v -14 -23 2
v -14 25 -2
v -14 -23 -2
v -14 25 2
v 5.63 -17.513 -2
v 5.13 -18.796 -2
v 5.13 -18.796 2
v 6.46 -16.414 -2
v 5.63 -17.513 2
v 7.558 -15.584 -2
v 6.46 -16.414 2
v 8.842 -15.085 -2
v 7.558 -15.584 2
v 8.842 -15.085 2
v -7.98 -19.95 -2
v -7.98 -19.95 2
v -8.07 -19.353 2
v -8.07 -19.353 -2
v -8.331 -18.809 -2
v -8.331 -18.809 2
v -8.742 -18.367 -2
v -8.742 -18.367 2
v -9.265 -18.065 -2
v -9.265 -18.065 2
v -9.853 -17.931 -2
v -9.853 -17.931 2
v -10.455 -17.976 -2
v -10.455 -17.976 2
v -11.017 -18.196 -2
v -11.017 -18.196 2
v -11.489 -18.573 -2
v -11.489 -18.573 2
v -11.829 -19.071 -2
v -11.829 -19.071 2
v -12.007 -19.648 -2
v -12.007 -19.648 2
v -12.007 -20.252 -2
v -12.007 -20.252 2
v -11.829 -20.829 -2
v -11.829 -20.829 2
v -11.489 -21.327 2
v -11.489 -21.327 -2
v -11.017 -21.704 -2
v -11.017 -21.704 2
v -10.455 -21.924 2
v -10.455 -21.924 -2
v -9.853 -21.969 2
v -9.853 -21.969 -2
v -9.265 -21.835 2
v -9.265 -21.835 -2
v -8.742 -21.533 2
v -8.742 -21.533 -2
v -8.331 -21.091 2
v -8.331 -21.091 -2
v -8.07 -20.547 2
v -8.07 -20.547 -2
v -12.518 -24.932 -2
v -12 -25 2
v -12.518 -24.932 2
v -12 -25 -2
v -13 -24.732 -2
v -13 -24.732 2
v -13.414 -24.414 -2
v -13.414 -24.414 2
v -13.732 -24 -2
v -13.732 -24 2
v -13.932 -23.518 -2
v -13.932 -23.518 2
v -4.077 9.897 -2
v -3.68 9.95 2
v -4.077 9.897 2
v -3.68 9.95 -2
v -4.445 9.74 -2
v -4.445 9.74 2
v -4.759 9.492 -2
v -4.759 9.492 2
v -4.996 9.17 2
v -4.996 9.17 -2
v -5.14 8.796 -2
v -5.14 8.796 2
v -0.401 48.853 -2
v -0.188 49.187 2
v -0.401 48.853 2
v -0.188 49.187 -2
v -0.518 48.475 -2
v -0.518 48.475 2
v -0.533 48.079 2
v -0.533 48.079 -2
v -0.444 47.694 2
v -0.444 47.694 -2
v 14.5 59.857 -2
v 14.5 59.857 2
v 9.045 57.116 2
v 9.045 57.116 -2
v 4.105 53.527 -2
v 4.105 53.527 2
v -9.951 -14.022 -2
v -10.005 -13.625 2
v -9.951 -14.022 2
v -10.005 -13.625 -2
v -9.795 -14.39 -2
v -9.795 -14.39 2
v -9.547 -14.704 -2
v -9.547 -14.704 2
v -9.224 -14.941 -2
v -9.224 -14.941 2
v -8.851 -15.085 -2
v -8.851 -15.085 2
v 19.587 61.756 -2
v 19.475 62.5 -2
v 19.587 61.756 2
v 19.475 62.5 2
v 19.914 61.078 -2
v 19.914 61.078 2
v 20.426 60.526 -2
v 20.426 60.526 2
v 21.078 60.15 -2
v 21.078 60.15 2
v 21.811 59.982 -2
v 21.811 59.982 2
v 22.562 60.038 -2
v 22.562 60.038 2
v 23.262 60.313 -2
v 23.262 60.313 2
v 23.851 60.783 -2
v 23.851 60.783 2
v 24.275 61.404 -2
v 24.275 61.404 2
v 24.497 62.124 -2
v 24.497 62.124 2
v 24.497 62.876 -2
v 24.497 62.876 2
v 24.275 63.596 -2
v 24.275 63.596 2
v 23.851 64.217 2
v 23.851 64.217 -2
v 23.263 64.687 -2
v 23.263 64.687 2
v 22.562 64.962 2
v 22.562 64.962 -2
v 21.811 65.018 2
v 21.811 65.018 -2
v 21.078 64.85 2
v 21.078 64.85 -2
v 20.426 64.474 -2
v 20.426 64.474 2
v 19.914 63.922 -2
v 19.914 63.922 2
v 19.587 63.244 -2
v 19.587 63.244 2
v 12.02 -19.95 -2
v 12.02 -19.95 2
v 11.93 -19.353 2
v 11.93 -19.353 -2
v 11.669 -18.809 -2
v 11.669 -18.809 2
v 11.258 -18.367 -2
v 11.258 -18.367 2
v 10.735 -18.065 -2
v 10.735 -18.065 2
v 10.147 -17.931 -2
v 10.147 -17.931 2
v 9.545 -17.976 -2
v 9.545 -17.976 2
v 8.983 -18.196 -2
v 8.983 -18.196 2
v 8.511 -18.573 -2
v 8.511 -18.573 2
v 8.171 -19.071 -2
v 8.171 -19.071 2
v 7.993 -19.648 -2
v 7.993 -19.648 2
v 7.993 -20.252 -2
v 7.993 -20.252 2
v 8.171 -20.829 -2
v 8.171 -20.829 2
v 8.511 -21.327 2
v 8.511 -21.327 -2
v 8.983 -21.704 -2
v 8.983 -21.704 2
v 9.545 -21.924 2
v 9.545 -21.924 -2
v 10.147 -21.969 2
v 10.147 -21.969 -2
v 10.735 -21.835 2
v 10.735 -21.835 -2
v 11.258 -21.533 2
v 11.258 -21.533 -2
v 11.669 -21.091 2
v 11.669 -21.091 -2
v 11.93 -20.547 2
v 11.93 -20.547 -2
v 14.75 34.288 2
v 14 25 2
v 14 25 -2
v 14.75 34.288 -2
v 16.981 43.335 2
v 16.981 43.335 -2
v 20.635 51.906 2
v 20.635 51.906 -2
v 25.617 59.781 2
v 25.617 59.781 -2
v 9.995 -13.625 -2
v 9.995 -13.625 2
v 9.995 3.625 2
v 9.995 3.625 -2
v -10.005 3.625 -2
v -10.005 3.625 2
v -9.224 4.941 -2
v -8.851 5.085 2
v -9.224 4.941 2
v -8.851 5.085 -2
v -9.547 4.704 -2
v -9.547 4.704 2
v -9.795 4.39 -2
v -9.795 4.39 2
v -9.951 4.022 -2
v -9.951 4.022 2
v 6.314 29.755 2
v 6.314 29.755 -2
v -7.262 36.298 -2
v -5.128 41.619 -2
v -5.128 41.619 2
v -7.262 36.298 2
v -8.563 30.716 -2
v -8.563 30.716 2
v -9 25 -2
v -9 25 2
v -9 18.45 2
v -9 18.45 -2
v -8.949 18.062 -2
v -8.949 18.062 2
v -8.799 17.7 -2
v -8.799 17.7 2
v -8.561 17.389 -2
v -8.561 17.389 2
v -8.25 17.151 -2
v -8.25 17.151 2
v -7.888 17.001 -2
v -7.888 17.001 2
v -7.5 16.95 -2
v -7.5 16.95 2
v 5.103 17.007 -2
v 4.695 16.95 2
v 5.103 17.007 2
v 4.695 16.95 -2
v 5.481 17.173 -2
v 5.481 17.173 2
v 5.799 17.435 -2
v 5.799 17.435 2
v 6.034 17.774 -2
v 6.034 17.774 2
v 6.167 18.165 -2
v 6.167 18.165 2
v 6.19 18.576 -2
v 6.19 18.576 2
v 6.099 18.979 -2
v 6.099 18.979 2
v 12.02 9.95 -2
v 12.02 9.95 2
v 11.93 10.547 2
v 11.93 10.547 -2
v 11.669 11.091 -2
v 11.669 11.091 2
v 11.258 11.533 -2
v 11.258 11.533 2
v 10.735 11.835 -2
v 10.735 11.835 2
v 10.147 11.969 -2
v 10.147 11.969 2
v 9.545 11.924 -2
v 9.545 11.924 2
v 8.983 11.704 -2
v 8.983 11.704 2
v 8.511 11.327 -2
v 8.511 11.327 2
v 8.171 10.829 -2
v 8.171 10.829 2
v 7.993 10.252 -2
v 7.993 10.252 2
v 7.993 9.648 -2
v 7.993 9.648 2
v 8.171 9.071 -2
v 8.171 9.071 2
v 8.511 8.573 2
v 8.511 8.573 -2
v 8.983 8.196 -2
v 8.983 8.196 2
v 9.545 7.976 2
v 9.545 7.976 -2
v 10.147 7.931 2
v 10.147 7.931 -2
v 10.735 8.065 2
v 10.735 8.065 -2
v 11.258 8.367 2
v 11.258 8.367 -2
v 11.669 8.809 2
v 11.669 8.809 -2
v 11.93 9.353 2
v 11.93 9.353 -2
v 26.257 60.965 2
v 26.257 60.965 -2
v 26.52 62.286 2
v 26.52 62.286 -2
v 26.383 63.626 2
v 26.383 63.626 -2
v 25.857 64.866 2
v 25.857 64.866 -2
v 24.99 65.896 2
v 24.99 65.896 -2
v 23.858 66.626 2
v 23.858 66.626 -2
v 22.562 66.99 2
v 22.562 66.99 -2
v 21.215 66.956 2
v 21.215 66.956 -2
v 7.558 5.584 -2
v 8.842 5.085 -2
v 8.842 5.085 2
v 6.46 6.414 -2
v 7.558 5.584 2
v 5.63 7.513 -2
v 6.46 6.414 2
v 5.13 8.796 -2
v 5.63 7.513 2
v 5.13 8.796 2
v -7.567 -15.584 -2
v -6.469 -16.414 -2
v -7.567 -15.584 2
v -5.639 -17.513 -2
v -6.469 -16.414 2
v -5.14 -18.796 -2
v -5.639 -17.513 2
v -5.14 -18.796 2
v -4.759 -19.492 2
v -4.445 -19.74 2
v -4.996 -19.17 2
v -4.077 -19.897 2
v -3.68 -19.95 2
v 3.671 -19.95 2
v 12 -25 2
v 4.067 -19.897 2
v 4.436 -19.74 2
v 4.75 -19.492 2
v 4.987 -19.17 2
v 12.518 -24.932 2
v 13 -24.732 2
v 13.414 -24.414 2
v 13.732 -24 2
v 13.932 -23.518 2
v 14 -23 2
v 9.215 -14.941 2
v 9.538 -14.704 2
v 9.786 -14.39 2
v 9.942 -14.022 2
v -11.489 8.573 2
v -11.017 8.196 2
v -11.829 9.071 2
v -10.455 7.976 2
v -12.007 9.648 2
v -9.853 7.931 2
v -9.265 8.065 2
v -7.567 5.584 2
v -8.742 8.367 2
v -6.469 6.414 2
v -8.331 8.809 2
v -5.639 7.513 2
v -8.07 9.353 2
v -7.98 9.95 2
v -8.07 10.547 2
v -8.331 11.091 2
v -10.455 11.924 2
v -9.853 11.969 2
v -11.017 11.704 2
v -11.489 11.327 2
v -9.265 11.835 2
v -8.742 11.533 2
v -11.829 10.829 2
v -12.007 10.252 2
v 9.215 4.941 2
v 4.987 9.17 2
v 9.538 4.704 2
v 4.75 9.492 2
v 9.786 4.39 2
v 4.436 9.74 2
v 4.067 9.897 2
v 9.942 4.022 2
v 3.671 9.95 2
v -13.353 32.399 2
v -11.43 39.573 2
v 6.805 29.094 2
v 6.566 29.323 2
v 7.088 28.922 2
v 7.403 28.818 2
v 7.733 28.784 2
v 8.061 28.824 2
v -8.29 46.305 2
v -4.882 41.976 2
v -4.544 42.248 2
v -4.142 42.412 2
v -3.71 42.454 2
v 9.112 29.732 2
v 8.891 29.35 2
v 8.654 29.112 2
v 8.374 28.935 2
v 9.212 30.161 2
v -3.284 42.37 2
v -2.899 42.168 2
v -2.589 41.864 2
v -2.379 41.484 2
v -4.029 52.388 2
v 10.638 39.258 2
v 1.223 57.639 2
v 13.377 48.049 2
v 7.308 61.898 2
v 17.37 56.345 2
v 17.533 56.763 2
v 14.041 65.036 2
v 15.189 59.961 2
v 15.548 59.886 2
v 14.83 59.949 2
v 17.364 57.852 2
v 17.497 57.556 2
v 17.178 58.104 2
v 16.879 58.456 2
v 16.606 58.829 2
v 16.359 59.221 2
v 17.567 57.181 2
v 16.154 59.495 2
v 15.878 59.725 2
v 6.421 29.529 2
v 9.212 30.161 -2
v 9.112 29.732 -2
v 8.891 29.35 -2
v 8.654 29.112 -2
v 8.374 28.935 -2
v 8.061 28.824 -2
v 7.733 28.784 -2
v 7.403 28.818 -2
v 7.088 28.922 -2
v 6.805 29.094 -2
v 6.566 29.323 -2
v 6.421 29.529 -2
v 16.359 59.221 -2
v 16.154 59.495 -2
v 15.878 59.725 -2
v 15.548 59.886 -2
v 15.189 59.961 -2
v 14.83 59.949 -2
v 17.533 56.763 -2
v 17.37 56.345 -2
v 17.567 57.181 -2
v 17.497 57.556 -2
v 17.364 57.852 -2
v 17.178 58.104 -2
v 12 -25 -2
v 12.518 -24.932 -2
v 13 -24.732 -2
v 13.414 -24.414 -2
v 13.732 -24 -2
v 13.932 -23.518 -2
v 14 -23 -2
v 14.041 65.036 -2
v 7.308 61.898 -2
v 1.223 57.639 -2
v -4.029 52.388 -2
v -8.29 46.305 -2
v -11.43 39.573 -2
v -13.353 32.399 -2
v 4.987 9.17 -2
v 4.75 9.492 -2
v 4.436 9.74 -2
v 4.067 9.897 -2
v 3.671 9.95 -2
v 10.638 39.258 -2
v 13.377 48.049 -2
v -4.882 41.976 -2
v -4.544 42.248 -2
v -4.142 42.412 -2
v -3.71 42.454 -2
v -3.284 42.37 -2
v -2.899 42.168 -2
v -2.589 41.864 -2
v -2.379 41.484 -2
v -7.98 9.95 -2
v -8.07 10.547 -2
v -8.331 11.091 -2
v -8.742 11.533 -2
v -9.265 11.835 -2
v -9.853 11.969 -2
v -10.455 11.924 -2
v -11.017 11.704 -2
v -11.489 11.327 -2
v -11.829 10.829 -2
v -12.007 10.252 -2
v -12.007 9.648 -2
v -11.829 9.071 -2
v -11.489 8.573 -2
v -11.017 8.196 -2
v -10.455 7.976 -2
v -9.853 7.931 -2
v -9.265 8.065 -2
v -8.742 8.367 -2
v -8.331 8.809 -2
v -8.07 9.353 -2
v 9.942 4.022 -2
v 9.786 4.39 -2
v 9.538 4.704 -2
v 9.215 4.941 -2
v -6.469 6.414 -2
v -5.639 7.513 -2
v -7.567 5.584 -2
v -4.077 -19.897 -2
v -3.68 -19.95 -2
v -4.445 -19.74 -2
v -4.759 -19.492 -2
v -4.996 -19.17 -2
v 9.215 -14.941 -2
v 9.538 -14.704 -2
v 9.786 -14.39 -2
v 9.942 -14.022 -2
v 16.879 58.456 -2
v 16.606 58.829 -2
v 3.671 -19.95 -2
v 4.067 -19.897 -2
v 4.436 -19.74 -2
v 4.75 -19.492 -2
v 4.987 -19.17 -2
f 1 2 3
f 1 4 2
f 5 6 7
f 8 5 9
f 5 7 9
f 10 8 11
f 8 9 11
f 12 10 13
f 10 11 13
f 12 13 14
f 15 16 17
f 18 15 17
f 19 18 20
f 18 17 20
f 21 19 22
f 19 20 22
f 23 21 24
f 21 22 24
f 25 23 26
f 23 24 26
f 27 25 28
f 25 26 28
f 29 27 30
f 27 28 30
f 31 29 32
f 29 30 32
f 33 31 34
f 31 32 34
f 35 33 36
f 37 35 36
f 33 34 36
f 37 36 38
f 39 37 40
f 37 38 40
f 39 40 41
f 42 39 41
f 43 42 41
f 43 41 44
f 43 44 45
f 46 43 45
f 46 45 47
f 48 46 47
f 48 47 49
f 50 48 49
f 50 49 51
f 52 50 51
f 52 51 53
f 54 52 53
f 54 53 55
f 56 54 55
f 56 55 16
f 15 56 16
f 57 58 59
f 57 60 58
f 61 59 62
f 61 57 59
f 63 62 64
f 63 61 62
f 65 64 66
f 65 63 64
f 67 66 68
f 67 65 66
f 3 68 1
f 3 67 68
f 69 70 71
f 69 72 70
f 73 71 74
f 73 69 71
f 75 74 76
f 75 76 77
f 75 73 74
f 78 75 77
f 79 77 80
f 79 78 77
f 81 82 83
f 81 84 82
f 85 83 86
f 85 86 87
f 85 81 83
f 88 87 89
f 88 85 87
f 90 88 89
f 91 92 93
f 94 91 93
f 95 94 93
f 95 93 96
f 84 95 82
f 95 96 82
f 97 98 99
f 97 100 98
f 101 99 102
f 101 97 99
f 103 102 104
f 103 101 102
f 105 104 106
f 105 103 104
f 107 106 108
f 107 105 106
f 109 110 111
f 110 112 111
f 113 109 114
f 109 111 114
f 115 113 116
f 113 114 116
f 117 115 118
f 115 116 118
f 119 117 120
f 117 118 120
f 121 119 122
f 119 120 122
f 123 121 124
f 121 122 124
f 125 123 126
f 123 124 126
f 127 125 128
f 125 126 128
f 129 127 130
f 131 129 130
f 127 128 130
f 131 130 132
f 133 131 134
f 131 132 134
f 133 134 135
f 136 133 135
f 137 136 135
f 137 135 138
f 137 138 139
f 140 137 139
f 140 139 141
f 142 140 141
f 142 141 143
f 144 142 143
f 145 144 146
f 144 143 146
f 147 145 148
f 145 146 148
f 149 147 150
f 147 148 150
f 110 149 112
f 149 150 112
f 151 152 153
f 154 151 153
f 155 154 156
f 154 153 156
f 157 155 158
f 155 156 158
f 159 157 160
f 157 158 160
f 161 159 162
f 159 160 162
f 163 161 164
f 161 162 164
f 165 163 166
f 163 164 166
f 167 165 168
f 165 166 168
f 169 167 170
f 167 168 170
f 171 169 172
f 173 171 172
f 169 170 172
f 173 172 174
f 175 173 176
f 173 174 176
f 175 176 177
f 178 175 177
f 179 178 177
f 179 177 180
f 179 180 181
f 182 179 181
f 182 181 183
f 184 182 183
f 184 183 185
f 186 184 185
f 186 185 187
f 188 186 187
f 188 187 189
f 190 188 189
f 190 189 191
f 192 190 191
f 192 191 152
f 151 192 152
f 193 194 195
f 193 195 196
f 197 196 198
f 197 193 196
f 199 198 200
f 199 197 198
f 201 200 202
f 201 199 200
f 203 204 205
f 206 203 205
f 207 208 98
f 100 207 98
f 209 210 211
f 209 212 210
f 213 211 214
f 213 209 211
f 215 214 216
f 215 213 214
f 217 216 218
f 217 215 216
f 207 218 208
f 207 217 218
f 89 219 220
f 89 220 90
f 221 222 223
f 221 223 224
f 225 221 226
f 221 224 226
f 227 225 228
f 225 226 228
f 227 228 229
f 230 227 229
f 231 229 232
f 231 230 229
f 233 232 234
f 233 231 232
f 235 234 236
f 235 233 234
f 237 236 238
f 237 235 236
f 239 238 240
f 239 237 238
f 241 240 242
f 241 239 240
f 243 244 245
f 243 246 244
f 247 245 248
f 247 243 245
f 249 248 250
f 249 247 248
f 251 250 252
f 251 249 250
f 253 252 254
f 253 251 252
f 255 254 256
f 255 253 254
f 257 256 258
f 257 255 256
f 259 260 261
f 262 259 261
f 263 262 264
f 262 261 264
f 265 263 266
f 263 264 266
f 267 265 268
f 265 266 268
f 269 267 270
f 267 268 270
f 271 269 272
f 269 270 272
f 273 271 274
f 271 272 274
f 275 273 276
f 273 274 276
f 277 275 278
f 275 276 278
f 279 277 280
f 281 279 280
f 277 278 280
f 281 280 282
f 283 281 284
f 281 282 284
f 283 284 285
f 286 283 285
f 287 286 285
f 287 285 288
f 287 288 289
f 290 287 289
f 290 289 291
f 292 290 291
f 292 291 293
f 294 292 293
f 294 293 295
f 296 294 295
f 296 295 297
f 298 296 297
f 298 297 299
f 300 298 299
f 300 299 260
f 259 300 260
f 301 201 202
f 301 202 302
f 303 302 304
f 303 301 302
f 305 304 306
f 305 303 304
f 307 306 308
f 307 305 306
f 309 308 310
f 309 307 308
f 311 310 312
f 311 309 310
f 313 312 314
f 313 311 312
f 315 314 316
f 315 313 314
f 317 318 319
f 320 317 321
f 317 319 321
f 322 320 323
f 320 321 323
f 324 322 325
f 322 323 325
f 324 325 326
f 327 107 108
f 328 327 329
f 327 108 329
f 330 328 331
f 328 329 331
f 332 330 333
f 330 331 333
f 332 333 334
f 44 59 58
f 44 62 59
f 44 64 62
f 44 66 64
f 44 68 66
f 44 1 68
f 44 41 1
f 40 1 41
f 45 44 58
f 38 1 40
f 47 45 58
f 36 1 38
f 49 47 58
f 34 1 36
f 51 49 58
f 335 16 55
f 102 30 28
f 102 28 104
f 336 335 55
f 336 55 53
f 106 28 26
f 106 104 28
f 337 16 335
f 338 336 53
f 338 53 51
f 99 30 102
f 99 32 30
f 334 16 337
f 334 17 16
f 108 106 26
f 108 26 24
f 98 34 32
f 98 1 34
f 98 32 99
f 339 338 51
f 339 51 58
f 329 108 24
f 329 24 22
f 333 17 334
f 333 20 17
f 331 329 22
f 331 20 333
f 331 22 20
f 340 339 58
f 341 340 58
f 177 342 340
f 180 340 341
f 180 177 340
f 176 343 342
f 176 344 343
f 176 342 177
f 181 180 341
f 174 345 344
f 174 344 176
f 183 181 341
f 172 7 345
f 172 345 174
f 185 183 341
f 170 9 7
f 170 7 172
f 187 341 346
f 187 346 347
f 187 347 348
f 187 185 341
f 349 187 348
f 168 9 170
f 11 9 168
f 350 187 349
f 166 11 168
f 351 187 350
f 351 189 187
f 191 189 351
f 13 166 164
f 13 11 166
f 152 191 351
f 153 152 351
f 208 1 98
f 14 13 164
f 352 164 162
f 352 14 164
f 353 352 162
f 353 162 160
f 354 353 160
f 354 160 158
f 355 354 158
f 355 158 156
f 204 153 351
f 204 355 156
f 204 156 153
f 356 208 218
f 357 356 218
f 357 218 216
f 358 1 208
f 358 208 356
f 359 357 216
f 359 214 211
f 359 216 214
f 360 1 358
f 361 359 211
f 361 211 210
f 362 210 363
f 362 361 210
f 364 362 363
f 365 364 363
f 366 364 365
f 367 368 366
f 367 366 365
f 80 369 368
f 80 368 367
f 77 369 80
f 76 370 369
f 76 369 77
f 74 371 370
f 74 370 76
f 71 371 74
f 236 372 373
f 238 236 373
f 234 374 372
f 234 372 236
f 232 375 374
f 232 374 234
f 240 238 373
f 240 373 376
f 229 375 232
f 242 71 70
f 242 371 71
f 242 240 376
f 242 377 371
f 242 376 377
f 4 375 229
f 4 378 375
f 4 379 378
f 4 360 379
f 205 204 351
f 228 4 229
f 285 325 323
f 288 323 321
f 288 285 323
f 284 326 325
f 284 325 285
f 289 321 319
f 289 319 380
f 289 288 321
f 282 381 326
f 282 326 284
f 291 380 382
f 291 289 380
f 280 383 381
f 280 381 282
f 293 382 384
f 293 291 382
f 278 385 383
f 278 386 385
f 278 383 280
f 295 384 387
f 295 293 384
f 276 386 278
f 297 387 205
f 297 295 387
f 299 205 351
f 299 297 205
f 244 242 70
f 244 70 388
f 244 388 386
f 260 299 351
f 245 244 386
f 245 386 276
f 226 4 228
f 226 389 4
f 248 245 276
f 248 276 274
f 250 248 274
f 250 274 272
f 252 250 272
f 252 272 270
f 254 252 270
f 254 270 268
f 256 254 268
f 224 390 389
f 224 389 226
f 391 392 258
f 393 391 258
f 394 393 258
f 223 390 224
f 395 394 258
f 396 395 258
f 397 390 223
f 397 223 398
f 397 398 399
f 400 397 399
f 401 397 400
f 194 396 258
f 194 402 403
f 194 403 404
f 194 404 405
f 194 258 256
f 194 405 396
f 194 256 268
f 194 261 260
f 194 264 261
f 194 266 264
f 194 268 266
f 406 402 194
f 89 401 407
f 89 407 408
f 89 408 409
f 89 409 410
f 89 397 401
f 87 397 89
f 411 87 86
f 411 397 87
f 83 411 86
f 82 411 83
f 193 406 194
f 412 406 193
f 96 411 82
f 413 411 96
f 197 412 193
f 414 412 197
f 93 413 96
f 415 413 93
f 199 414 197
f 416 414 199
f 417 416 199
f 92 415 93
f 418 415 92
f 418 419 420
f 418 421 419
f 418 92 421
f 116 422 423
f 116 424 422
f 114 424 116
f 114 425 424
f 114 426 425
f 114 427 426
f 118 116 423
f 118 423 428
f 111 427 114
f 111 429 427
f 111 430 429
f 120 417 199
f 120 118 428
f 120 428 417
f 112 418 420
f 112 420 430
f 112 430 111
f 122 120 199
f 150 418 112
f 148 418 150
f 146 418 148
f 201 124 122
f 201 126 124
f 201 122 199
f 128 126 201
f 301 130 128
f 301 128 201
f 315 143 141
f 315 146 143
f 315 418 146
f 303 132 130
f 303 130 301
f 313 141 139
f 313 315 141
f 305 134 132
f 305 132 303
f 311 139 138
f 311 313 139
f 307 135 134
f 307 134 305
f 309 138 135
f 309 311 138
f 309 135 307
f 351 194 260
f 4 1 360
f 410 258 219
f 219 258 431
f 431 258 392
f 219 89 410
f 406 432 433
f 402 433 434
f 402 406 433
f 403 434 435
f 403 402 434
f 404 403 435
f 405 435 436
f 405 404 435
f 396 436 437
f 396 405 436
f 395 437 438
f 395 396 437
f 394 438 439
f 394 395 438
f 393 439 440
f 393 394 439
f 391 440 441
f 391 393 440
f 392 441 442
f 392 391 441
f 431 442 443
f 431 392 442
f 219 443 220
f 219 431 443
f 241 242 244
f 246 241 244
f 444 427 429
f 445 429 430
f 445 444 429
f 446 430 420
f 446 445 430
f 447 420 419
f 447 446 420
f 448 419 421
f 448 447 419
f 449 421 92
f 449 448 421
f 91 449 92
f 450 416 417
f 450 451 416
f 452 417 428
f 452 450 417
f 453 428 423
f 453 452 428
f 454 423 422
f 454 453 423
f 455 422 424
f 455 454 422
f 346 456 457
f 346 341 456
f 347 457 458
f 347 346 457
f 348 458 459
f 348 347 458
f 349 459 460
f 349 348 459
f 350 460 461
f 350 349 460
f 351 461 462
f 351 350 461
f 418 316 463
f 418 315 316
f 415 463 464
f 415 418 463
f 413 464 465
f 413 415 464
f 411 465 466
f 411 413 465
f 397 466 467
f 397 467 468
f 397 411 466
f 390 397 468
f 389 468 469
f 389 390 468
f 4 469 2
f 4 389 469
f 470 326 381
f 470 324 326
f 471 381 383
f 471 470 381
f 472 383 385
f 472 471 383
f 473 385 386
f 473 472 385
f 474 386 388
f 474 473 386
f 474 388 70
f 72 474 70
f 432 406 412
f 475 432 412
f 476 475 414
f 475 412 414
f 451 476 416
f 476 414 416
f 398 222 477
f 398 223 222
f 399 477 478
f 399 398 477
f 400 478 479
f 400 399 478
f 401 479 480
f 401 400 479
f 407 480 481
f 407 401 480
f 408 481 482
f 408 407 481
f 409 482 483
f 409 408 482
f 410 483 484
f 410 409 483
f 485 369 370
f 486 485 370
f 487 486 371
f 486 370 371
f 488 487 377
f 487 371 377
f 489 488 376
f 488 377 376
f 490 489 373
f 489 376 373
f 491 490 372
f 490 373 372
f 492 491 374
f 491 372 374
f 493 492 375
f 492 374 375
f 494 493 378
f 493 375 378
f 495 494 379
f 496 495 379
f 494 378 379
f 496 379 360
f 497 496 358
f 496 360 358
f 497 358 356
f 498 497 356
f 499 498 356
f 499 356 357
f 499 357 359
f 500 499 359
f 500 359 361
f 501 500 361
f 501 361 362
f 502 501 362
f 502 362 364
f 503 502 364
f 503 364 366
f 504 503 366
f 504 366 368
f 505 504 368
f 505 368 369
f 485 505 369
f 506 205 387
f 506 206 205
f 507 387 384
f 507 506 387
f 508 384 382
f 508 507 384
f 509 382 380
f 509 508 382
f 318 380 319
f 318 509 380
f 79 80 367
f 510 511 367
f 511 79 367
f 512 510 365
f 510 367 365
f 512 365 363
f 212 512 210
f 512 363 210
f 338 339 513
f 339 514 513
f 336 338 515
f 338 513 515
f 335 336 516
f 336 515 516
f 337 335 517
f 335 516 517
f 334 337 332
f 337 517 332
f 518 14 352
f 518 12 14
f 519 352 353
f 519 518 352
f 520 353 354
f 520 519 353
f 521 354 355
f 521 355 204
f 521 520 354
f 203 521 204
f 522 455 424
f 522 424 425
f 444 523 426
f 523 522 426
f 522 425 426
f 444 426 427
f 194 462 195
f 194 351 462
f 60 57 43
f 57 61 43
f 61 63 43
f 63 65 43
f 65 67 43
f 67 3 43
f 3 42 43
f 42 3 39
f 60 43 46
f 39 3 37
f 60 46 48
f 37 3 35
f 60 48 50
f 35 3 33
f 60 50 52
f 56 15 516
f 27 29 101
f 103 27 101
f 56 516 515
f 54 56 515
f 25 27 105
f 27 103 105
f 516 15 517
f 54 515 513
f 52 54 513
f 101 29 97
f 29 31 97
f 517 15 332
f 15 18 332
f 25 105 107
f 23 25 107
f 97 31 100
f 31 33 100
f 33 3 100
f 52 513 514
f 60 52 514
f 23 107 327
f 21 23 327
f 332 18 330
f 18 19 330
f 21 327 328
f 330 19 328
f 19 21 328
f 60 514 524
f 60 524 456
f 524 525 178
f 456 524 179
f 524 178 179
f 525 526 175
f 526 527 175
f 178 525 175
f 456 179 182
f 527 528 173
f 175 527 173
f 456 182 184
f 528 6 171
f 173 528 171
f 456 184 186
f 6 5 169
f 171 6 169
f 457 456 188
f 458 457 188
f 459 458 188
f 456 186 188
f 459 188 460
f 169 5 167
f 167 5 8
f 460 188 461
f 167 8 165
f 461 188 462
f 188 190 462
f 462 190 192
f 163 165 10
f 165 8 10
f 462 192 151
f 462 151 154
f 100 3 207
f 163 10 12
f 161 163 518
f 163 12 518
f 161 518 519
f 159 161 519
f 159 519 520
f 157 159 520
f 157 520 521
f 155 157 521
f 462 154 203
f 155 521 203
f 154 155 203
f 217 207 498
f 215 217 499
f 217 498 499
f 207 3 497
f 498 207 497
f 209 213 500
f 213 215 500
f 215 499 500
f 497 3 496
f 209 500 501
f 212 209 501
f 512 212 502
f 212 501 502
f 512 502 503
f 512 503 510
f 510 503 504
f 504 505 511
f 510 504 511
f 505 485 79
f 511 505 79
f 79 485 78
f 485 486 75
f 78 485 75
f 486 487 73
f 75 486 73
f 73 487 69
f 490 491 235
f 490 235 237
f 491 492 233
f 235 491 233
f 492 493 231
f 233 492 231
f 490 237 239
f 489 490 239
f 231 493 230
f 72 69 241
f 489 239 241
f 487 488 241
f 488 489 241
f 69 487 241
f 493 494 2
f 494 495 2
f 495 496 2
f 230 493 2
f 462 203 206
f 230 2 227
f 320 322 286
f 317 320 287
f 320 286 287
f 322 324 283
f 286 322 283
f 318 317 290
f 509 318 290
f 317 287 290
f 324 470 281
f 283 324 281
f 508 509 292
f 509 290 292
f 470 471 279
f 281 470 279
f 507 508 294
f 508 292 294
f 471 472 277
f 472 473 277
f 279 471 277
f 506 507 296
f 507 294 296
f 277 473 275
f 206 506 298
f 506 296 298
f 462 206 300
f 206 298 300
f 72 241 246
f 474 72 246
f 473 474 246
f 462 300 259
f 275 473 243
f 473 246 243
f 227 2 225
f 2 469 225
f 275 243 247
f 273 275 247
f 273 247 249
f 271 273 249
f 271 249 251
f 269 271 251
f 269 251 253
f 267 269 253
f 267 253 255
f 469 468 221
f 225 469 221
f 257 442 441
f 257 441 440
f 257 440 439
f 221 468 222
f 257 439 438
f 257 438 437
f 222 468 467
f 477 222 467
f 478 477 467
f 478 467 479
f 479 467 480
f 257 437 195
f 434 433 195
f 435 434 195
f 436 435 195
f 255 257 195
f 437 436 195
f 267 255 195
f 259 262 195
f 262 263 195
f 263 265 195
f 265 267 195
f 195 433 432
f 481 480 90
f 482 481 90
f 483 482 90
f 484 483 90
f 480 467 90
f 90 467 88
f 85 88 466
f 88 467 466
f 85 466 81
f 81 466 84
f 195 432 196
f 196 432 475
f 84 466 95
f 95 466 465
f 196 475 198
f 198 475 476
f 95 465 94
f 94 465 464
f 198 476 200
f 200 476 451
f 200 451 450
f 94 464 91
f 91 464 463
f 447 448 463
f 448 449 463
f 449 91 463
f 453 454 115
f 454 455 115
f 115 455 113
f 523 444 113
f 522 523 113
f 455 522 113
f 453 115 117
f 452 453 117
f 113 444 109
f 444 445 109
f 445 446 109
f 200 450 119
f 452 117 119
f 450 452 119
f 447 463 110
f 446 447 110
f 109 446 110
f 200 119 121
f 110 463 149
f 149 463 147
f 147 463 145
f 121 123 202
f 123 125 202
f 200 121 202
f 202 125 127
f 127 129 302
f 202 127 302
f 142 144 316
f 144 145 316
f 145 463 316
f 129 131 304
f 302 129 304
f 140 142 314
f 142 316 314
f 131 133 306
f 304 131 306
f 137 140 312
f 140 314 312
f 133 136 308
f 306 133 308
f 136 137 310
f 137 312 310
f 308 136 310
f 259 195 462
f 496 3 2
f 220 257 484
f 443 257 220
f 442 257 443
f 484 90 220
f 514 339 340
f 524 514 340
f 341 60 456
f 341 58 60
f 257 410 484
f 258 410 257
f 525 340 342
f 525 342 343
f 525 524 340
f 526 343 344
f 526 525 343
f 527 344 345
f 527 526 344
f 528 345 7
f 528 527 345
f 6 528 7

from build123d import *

# Parameters (mm, degrees)
SKETCH_1_R          = 1.525
EXTRUDE_1_DEPTH     = 2
FILLET_1_R          = 2
SKETCH_3_R          = 2.525
CUT_EXTRUDE_1_DEPTH = 11
SKETCH_4_R          = 2.025
CUT_EXTRUDE_2_DEPTH = 20
CUT_EXTRUDE_3_DEPTH = 20
FILLET_2_R          = 1.5
CUT_EXTRUDE_4_DEPTH = 10
EXTRUDE_2_DEPTH     = 4
FILLET_3_R          = 1.5


with BuildPart() as part:
    # 草图1 → 凸台-拉伸1 (new, symmetric)
    with BuildSketch(Plane.XY):
        with BuildLine():
            Line((-14, -25), (14, -25))
            Line((14, -25), (14, 25))
            ThreePointArc((14, 25), (16.980954382, 43.334686237), (25.616740047, 59.780658824))
            ThreePointArc((25.616740047, 59.780658824), (25.857254614, 64.865842734), (21.215464165, 66.956470411))
            ThreePointArc((21.215464165, 66.956470411), (-4.029350016, 52.38829278), (-14, 25))
            Line((-14, 25), (-14, -25))
        make_face()
        with Locations((22, 62.5)):
            Circle(SKETCH_1_R, mode=Mode.SUBTRACT)
    extrude(amount=EXTRUDE_1_DEPTH, both=True)

    # 圆角1
    fillet_1_edges = [part.edges().sort_by_distance(p)[0] for p in [
        (14, -25, 0),
        (-14, -25, 0),
    ]]
    fillet(fillet_1_edges, radius=FILLET_1_R)

    # 草图3 → 切除-拉伸1 (cut, symmetric)
    with BuildSketch(Plane.XY.offset(2)):
        with Locations(Location((22, 62.5, 0), (0, 0, 180))):
            Circle(SKETCH_3_R)
    extrude(amount=CUT_EXTRUDE_1_DEPTH, both=True, mode=Mode.SUBTRACT)

    # 草图4 → 切除-拉伸2 (cut)
    with BuildSketch(Plane.XY.offset(2)):
        with Locations((-10.004554112, 9.95)):
            Circle(SKETCH_4_R)
        with Locations((9.995445888, 9.95)):
            Circle(SKETCH_4_R)
        with Locations((9.995445888, -19.95)):
            Circle(SKETCH_4_R)
        with Locations((-10.004554112, -19.95)):
            Circle(SKETCH_4_R)
    extrude(amount=-CUT_EXTRUDE_2_DEPTH, mode=Mode.SUBTRACT)

    # 草图5 → 切除-拉伸3 (cut)
    with BuildSketch(Plane.XY.offset(2)):
        with BuildLine():
            ThreePointArc((-10.004554112, -14.95), (-6.469020206, -16.414466094), (-5.004554112, -19.95))
            Line((-5.004554112, -19.95), (4.995445888, -19.95))
            ThreePointArc((4.995445888, -19.95), (6.459911982, -16.414466094), (9.995445888, -14.95))
            Line((9.995445888, -14.95), (9.995445888, 4.95))
            ThreePointArc((9.995445888, 4.95), (6.459911982, 6.414466094), (4.995445888, 9.95))
            Line((4.995445888, 9.95), (-5.004554112, 9.95))
            ThreePointArc((-5.004554112, 9.95), (-6.469020206, 6.414466094), (-10.004554112, 4.95))
            Line((-10.004554112, 4.95), (-10.004554112, -14.95))
        make_face()
    extrude(amount=-CUT_EXTRUDE_3_DEPTH, mode=Mode.SUBTRACT)

    # 圆角2
    fillet_2_edges = [part.edges().sort_by_distance(p)[0] for p in [
        (9.995445888, -14.95, 0),
        (4.995445888, -19.95, 0),
        (-5.004554112, -19.95, 0),
        (-10.004554112, -14.95, 0),
        (-10.004554112, 4.95, 0),
        (-5.004554112, 9.95, 0),
        (4.995445888, 9.95, 0),
        (9.995445888, 4.95, 0),
    ]]
    fillet(fillet_2_edges, radius=FILLET_2_R)

    # 草图6 → 切除-拉伸4 (cut)
    with BuildSketch(Plane.XY.offset(2)):
        with BuildLine():
            Line((-9, 25), (-9, 16.95))
            Line((-9, 16.95), (9, 16.95))
            Line((9, 16.95), (9, 25))
            ThreePointArc((9, 25), (11.284284207, 41.793802743), (17.971158754, 57.367353196))
            ThreePointArc((17.971158754, 57.367353196), (16.686132643, 58.713386908), (15.833336193, 60.367423509))
            ThreePointArc((15.833336193, 60.367423509), (-2.171664491, 46.607575246), (-9, 25))
        make_face()
    extrude(amount=-CUT_EXTRUDE_4_DEPTH, mode=Mode.SUBTRACT)

    # 草图7 → 凸台-拉伸2 (add)
    with BuildSketch(Plane.XY.offset(2)):
        Polygon((-4.043281882, 45.902558691), (7.128382609, 16.244983445), (10.871617391, 17.655016555), (-0.748810192, 48.503929507), align=None)
    extrude(amount=-EXTRUDE_2_DEPTH)

    # 圆角3
    fillet_3_edges = [part.edges().sort_by_distance(p)[0] for p in [
        (-0.748810192, 48.503929507, 0),
        (15.833336193, 60.367423509, 0),
        (9, 22.623625632, 0),
        (17.971158754, 57.367353196, 0),
        (-3.527808844, 44.534125149, 0),
        (-9, 16.95, 0),
        (6.862811053, 16.95, 0),
    ]]
    fillet(fillet_3_edges, radius=FILLET_3_R)


solid = part.part
